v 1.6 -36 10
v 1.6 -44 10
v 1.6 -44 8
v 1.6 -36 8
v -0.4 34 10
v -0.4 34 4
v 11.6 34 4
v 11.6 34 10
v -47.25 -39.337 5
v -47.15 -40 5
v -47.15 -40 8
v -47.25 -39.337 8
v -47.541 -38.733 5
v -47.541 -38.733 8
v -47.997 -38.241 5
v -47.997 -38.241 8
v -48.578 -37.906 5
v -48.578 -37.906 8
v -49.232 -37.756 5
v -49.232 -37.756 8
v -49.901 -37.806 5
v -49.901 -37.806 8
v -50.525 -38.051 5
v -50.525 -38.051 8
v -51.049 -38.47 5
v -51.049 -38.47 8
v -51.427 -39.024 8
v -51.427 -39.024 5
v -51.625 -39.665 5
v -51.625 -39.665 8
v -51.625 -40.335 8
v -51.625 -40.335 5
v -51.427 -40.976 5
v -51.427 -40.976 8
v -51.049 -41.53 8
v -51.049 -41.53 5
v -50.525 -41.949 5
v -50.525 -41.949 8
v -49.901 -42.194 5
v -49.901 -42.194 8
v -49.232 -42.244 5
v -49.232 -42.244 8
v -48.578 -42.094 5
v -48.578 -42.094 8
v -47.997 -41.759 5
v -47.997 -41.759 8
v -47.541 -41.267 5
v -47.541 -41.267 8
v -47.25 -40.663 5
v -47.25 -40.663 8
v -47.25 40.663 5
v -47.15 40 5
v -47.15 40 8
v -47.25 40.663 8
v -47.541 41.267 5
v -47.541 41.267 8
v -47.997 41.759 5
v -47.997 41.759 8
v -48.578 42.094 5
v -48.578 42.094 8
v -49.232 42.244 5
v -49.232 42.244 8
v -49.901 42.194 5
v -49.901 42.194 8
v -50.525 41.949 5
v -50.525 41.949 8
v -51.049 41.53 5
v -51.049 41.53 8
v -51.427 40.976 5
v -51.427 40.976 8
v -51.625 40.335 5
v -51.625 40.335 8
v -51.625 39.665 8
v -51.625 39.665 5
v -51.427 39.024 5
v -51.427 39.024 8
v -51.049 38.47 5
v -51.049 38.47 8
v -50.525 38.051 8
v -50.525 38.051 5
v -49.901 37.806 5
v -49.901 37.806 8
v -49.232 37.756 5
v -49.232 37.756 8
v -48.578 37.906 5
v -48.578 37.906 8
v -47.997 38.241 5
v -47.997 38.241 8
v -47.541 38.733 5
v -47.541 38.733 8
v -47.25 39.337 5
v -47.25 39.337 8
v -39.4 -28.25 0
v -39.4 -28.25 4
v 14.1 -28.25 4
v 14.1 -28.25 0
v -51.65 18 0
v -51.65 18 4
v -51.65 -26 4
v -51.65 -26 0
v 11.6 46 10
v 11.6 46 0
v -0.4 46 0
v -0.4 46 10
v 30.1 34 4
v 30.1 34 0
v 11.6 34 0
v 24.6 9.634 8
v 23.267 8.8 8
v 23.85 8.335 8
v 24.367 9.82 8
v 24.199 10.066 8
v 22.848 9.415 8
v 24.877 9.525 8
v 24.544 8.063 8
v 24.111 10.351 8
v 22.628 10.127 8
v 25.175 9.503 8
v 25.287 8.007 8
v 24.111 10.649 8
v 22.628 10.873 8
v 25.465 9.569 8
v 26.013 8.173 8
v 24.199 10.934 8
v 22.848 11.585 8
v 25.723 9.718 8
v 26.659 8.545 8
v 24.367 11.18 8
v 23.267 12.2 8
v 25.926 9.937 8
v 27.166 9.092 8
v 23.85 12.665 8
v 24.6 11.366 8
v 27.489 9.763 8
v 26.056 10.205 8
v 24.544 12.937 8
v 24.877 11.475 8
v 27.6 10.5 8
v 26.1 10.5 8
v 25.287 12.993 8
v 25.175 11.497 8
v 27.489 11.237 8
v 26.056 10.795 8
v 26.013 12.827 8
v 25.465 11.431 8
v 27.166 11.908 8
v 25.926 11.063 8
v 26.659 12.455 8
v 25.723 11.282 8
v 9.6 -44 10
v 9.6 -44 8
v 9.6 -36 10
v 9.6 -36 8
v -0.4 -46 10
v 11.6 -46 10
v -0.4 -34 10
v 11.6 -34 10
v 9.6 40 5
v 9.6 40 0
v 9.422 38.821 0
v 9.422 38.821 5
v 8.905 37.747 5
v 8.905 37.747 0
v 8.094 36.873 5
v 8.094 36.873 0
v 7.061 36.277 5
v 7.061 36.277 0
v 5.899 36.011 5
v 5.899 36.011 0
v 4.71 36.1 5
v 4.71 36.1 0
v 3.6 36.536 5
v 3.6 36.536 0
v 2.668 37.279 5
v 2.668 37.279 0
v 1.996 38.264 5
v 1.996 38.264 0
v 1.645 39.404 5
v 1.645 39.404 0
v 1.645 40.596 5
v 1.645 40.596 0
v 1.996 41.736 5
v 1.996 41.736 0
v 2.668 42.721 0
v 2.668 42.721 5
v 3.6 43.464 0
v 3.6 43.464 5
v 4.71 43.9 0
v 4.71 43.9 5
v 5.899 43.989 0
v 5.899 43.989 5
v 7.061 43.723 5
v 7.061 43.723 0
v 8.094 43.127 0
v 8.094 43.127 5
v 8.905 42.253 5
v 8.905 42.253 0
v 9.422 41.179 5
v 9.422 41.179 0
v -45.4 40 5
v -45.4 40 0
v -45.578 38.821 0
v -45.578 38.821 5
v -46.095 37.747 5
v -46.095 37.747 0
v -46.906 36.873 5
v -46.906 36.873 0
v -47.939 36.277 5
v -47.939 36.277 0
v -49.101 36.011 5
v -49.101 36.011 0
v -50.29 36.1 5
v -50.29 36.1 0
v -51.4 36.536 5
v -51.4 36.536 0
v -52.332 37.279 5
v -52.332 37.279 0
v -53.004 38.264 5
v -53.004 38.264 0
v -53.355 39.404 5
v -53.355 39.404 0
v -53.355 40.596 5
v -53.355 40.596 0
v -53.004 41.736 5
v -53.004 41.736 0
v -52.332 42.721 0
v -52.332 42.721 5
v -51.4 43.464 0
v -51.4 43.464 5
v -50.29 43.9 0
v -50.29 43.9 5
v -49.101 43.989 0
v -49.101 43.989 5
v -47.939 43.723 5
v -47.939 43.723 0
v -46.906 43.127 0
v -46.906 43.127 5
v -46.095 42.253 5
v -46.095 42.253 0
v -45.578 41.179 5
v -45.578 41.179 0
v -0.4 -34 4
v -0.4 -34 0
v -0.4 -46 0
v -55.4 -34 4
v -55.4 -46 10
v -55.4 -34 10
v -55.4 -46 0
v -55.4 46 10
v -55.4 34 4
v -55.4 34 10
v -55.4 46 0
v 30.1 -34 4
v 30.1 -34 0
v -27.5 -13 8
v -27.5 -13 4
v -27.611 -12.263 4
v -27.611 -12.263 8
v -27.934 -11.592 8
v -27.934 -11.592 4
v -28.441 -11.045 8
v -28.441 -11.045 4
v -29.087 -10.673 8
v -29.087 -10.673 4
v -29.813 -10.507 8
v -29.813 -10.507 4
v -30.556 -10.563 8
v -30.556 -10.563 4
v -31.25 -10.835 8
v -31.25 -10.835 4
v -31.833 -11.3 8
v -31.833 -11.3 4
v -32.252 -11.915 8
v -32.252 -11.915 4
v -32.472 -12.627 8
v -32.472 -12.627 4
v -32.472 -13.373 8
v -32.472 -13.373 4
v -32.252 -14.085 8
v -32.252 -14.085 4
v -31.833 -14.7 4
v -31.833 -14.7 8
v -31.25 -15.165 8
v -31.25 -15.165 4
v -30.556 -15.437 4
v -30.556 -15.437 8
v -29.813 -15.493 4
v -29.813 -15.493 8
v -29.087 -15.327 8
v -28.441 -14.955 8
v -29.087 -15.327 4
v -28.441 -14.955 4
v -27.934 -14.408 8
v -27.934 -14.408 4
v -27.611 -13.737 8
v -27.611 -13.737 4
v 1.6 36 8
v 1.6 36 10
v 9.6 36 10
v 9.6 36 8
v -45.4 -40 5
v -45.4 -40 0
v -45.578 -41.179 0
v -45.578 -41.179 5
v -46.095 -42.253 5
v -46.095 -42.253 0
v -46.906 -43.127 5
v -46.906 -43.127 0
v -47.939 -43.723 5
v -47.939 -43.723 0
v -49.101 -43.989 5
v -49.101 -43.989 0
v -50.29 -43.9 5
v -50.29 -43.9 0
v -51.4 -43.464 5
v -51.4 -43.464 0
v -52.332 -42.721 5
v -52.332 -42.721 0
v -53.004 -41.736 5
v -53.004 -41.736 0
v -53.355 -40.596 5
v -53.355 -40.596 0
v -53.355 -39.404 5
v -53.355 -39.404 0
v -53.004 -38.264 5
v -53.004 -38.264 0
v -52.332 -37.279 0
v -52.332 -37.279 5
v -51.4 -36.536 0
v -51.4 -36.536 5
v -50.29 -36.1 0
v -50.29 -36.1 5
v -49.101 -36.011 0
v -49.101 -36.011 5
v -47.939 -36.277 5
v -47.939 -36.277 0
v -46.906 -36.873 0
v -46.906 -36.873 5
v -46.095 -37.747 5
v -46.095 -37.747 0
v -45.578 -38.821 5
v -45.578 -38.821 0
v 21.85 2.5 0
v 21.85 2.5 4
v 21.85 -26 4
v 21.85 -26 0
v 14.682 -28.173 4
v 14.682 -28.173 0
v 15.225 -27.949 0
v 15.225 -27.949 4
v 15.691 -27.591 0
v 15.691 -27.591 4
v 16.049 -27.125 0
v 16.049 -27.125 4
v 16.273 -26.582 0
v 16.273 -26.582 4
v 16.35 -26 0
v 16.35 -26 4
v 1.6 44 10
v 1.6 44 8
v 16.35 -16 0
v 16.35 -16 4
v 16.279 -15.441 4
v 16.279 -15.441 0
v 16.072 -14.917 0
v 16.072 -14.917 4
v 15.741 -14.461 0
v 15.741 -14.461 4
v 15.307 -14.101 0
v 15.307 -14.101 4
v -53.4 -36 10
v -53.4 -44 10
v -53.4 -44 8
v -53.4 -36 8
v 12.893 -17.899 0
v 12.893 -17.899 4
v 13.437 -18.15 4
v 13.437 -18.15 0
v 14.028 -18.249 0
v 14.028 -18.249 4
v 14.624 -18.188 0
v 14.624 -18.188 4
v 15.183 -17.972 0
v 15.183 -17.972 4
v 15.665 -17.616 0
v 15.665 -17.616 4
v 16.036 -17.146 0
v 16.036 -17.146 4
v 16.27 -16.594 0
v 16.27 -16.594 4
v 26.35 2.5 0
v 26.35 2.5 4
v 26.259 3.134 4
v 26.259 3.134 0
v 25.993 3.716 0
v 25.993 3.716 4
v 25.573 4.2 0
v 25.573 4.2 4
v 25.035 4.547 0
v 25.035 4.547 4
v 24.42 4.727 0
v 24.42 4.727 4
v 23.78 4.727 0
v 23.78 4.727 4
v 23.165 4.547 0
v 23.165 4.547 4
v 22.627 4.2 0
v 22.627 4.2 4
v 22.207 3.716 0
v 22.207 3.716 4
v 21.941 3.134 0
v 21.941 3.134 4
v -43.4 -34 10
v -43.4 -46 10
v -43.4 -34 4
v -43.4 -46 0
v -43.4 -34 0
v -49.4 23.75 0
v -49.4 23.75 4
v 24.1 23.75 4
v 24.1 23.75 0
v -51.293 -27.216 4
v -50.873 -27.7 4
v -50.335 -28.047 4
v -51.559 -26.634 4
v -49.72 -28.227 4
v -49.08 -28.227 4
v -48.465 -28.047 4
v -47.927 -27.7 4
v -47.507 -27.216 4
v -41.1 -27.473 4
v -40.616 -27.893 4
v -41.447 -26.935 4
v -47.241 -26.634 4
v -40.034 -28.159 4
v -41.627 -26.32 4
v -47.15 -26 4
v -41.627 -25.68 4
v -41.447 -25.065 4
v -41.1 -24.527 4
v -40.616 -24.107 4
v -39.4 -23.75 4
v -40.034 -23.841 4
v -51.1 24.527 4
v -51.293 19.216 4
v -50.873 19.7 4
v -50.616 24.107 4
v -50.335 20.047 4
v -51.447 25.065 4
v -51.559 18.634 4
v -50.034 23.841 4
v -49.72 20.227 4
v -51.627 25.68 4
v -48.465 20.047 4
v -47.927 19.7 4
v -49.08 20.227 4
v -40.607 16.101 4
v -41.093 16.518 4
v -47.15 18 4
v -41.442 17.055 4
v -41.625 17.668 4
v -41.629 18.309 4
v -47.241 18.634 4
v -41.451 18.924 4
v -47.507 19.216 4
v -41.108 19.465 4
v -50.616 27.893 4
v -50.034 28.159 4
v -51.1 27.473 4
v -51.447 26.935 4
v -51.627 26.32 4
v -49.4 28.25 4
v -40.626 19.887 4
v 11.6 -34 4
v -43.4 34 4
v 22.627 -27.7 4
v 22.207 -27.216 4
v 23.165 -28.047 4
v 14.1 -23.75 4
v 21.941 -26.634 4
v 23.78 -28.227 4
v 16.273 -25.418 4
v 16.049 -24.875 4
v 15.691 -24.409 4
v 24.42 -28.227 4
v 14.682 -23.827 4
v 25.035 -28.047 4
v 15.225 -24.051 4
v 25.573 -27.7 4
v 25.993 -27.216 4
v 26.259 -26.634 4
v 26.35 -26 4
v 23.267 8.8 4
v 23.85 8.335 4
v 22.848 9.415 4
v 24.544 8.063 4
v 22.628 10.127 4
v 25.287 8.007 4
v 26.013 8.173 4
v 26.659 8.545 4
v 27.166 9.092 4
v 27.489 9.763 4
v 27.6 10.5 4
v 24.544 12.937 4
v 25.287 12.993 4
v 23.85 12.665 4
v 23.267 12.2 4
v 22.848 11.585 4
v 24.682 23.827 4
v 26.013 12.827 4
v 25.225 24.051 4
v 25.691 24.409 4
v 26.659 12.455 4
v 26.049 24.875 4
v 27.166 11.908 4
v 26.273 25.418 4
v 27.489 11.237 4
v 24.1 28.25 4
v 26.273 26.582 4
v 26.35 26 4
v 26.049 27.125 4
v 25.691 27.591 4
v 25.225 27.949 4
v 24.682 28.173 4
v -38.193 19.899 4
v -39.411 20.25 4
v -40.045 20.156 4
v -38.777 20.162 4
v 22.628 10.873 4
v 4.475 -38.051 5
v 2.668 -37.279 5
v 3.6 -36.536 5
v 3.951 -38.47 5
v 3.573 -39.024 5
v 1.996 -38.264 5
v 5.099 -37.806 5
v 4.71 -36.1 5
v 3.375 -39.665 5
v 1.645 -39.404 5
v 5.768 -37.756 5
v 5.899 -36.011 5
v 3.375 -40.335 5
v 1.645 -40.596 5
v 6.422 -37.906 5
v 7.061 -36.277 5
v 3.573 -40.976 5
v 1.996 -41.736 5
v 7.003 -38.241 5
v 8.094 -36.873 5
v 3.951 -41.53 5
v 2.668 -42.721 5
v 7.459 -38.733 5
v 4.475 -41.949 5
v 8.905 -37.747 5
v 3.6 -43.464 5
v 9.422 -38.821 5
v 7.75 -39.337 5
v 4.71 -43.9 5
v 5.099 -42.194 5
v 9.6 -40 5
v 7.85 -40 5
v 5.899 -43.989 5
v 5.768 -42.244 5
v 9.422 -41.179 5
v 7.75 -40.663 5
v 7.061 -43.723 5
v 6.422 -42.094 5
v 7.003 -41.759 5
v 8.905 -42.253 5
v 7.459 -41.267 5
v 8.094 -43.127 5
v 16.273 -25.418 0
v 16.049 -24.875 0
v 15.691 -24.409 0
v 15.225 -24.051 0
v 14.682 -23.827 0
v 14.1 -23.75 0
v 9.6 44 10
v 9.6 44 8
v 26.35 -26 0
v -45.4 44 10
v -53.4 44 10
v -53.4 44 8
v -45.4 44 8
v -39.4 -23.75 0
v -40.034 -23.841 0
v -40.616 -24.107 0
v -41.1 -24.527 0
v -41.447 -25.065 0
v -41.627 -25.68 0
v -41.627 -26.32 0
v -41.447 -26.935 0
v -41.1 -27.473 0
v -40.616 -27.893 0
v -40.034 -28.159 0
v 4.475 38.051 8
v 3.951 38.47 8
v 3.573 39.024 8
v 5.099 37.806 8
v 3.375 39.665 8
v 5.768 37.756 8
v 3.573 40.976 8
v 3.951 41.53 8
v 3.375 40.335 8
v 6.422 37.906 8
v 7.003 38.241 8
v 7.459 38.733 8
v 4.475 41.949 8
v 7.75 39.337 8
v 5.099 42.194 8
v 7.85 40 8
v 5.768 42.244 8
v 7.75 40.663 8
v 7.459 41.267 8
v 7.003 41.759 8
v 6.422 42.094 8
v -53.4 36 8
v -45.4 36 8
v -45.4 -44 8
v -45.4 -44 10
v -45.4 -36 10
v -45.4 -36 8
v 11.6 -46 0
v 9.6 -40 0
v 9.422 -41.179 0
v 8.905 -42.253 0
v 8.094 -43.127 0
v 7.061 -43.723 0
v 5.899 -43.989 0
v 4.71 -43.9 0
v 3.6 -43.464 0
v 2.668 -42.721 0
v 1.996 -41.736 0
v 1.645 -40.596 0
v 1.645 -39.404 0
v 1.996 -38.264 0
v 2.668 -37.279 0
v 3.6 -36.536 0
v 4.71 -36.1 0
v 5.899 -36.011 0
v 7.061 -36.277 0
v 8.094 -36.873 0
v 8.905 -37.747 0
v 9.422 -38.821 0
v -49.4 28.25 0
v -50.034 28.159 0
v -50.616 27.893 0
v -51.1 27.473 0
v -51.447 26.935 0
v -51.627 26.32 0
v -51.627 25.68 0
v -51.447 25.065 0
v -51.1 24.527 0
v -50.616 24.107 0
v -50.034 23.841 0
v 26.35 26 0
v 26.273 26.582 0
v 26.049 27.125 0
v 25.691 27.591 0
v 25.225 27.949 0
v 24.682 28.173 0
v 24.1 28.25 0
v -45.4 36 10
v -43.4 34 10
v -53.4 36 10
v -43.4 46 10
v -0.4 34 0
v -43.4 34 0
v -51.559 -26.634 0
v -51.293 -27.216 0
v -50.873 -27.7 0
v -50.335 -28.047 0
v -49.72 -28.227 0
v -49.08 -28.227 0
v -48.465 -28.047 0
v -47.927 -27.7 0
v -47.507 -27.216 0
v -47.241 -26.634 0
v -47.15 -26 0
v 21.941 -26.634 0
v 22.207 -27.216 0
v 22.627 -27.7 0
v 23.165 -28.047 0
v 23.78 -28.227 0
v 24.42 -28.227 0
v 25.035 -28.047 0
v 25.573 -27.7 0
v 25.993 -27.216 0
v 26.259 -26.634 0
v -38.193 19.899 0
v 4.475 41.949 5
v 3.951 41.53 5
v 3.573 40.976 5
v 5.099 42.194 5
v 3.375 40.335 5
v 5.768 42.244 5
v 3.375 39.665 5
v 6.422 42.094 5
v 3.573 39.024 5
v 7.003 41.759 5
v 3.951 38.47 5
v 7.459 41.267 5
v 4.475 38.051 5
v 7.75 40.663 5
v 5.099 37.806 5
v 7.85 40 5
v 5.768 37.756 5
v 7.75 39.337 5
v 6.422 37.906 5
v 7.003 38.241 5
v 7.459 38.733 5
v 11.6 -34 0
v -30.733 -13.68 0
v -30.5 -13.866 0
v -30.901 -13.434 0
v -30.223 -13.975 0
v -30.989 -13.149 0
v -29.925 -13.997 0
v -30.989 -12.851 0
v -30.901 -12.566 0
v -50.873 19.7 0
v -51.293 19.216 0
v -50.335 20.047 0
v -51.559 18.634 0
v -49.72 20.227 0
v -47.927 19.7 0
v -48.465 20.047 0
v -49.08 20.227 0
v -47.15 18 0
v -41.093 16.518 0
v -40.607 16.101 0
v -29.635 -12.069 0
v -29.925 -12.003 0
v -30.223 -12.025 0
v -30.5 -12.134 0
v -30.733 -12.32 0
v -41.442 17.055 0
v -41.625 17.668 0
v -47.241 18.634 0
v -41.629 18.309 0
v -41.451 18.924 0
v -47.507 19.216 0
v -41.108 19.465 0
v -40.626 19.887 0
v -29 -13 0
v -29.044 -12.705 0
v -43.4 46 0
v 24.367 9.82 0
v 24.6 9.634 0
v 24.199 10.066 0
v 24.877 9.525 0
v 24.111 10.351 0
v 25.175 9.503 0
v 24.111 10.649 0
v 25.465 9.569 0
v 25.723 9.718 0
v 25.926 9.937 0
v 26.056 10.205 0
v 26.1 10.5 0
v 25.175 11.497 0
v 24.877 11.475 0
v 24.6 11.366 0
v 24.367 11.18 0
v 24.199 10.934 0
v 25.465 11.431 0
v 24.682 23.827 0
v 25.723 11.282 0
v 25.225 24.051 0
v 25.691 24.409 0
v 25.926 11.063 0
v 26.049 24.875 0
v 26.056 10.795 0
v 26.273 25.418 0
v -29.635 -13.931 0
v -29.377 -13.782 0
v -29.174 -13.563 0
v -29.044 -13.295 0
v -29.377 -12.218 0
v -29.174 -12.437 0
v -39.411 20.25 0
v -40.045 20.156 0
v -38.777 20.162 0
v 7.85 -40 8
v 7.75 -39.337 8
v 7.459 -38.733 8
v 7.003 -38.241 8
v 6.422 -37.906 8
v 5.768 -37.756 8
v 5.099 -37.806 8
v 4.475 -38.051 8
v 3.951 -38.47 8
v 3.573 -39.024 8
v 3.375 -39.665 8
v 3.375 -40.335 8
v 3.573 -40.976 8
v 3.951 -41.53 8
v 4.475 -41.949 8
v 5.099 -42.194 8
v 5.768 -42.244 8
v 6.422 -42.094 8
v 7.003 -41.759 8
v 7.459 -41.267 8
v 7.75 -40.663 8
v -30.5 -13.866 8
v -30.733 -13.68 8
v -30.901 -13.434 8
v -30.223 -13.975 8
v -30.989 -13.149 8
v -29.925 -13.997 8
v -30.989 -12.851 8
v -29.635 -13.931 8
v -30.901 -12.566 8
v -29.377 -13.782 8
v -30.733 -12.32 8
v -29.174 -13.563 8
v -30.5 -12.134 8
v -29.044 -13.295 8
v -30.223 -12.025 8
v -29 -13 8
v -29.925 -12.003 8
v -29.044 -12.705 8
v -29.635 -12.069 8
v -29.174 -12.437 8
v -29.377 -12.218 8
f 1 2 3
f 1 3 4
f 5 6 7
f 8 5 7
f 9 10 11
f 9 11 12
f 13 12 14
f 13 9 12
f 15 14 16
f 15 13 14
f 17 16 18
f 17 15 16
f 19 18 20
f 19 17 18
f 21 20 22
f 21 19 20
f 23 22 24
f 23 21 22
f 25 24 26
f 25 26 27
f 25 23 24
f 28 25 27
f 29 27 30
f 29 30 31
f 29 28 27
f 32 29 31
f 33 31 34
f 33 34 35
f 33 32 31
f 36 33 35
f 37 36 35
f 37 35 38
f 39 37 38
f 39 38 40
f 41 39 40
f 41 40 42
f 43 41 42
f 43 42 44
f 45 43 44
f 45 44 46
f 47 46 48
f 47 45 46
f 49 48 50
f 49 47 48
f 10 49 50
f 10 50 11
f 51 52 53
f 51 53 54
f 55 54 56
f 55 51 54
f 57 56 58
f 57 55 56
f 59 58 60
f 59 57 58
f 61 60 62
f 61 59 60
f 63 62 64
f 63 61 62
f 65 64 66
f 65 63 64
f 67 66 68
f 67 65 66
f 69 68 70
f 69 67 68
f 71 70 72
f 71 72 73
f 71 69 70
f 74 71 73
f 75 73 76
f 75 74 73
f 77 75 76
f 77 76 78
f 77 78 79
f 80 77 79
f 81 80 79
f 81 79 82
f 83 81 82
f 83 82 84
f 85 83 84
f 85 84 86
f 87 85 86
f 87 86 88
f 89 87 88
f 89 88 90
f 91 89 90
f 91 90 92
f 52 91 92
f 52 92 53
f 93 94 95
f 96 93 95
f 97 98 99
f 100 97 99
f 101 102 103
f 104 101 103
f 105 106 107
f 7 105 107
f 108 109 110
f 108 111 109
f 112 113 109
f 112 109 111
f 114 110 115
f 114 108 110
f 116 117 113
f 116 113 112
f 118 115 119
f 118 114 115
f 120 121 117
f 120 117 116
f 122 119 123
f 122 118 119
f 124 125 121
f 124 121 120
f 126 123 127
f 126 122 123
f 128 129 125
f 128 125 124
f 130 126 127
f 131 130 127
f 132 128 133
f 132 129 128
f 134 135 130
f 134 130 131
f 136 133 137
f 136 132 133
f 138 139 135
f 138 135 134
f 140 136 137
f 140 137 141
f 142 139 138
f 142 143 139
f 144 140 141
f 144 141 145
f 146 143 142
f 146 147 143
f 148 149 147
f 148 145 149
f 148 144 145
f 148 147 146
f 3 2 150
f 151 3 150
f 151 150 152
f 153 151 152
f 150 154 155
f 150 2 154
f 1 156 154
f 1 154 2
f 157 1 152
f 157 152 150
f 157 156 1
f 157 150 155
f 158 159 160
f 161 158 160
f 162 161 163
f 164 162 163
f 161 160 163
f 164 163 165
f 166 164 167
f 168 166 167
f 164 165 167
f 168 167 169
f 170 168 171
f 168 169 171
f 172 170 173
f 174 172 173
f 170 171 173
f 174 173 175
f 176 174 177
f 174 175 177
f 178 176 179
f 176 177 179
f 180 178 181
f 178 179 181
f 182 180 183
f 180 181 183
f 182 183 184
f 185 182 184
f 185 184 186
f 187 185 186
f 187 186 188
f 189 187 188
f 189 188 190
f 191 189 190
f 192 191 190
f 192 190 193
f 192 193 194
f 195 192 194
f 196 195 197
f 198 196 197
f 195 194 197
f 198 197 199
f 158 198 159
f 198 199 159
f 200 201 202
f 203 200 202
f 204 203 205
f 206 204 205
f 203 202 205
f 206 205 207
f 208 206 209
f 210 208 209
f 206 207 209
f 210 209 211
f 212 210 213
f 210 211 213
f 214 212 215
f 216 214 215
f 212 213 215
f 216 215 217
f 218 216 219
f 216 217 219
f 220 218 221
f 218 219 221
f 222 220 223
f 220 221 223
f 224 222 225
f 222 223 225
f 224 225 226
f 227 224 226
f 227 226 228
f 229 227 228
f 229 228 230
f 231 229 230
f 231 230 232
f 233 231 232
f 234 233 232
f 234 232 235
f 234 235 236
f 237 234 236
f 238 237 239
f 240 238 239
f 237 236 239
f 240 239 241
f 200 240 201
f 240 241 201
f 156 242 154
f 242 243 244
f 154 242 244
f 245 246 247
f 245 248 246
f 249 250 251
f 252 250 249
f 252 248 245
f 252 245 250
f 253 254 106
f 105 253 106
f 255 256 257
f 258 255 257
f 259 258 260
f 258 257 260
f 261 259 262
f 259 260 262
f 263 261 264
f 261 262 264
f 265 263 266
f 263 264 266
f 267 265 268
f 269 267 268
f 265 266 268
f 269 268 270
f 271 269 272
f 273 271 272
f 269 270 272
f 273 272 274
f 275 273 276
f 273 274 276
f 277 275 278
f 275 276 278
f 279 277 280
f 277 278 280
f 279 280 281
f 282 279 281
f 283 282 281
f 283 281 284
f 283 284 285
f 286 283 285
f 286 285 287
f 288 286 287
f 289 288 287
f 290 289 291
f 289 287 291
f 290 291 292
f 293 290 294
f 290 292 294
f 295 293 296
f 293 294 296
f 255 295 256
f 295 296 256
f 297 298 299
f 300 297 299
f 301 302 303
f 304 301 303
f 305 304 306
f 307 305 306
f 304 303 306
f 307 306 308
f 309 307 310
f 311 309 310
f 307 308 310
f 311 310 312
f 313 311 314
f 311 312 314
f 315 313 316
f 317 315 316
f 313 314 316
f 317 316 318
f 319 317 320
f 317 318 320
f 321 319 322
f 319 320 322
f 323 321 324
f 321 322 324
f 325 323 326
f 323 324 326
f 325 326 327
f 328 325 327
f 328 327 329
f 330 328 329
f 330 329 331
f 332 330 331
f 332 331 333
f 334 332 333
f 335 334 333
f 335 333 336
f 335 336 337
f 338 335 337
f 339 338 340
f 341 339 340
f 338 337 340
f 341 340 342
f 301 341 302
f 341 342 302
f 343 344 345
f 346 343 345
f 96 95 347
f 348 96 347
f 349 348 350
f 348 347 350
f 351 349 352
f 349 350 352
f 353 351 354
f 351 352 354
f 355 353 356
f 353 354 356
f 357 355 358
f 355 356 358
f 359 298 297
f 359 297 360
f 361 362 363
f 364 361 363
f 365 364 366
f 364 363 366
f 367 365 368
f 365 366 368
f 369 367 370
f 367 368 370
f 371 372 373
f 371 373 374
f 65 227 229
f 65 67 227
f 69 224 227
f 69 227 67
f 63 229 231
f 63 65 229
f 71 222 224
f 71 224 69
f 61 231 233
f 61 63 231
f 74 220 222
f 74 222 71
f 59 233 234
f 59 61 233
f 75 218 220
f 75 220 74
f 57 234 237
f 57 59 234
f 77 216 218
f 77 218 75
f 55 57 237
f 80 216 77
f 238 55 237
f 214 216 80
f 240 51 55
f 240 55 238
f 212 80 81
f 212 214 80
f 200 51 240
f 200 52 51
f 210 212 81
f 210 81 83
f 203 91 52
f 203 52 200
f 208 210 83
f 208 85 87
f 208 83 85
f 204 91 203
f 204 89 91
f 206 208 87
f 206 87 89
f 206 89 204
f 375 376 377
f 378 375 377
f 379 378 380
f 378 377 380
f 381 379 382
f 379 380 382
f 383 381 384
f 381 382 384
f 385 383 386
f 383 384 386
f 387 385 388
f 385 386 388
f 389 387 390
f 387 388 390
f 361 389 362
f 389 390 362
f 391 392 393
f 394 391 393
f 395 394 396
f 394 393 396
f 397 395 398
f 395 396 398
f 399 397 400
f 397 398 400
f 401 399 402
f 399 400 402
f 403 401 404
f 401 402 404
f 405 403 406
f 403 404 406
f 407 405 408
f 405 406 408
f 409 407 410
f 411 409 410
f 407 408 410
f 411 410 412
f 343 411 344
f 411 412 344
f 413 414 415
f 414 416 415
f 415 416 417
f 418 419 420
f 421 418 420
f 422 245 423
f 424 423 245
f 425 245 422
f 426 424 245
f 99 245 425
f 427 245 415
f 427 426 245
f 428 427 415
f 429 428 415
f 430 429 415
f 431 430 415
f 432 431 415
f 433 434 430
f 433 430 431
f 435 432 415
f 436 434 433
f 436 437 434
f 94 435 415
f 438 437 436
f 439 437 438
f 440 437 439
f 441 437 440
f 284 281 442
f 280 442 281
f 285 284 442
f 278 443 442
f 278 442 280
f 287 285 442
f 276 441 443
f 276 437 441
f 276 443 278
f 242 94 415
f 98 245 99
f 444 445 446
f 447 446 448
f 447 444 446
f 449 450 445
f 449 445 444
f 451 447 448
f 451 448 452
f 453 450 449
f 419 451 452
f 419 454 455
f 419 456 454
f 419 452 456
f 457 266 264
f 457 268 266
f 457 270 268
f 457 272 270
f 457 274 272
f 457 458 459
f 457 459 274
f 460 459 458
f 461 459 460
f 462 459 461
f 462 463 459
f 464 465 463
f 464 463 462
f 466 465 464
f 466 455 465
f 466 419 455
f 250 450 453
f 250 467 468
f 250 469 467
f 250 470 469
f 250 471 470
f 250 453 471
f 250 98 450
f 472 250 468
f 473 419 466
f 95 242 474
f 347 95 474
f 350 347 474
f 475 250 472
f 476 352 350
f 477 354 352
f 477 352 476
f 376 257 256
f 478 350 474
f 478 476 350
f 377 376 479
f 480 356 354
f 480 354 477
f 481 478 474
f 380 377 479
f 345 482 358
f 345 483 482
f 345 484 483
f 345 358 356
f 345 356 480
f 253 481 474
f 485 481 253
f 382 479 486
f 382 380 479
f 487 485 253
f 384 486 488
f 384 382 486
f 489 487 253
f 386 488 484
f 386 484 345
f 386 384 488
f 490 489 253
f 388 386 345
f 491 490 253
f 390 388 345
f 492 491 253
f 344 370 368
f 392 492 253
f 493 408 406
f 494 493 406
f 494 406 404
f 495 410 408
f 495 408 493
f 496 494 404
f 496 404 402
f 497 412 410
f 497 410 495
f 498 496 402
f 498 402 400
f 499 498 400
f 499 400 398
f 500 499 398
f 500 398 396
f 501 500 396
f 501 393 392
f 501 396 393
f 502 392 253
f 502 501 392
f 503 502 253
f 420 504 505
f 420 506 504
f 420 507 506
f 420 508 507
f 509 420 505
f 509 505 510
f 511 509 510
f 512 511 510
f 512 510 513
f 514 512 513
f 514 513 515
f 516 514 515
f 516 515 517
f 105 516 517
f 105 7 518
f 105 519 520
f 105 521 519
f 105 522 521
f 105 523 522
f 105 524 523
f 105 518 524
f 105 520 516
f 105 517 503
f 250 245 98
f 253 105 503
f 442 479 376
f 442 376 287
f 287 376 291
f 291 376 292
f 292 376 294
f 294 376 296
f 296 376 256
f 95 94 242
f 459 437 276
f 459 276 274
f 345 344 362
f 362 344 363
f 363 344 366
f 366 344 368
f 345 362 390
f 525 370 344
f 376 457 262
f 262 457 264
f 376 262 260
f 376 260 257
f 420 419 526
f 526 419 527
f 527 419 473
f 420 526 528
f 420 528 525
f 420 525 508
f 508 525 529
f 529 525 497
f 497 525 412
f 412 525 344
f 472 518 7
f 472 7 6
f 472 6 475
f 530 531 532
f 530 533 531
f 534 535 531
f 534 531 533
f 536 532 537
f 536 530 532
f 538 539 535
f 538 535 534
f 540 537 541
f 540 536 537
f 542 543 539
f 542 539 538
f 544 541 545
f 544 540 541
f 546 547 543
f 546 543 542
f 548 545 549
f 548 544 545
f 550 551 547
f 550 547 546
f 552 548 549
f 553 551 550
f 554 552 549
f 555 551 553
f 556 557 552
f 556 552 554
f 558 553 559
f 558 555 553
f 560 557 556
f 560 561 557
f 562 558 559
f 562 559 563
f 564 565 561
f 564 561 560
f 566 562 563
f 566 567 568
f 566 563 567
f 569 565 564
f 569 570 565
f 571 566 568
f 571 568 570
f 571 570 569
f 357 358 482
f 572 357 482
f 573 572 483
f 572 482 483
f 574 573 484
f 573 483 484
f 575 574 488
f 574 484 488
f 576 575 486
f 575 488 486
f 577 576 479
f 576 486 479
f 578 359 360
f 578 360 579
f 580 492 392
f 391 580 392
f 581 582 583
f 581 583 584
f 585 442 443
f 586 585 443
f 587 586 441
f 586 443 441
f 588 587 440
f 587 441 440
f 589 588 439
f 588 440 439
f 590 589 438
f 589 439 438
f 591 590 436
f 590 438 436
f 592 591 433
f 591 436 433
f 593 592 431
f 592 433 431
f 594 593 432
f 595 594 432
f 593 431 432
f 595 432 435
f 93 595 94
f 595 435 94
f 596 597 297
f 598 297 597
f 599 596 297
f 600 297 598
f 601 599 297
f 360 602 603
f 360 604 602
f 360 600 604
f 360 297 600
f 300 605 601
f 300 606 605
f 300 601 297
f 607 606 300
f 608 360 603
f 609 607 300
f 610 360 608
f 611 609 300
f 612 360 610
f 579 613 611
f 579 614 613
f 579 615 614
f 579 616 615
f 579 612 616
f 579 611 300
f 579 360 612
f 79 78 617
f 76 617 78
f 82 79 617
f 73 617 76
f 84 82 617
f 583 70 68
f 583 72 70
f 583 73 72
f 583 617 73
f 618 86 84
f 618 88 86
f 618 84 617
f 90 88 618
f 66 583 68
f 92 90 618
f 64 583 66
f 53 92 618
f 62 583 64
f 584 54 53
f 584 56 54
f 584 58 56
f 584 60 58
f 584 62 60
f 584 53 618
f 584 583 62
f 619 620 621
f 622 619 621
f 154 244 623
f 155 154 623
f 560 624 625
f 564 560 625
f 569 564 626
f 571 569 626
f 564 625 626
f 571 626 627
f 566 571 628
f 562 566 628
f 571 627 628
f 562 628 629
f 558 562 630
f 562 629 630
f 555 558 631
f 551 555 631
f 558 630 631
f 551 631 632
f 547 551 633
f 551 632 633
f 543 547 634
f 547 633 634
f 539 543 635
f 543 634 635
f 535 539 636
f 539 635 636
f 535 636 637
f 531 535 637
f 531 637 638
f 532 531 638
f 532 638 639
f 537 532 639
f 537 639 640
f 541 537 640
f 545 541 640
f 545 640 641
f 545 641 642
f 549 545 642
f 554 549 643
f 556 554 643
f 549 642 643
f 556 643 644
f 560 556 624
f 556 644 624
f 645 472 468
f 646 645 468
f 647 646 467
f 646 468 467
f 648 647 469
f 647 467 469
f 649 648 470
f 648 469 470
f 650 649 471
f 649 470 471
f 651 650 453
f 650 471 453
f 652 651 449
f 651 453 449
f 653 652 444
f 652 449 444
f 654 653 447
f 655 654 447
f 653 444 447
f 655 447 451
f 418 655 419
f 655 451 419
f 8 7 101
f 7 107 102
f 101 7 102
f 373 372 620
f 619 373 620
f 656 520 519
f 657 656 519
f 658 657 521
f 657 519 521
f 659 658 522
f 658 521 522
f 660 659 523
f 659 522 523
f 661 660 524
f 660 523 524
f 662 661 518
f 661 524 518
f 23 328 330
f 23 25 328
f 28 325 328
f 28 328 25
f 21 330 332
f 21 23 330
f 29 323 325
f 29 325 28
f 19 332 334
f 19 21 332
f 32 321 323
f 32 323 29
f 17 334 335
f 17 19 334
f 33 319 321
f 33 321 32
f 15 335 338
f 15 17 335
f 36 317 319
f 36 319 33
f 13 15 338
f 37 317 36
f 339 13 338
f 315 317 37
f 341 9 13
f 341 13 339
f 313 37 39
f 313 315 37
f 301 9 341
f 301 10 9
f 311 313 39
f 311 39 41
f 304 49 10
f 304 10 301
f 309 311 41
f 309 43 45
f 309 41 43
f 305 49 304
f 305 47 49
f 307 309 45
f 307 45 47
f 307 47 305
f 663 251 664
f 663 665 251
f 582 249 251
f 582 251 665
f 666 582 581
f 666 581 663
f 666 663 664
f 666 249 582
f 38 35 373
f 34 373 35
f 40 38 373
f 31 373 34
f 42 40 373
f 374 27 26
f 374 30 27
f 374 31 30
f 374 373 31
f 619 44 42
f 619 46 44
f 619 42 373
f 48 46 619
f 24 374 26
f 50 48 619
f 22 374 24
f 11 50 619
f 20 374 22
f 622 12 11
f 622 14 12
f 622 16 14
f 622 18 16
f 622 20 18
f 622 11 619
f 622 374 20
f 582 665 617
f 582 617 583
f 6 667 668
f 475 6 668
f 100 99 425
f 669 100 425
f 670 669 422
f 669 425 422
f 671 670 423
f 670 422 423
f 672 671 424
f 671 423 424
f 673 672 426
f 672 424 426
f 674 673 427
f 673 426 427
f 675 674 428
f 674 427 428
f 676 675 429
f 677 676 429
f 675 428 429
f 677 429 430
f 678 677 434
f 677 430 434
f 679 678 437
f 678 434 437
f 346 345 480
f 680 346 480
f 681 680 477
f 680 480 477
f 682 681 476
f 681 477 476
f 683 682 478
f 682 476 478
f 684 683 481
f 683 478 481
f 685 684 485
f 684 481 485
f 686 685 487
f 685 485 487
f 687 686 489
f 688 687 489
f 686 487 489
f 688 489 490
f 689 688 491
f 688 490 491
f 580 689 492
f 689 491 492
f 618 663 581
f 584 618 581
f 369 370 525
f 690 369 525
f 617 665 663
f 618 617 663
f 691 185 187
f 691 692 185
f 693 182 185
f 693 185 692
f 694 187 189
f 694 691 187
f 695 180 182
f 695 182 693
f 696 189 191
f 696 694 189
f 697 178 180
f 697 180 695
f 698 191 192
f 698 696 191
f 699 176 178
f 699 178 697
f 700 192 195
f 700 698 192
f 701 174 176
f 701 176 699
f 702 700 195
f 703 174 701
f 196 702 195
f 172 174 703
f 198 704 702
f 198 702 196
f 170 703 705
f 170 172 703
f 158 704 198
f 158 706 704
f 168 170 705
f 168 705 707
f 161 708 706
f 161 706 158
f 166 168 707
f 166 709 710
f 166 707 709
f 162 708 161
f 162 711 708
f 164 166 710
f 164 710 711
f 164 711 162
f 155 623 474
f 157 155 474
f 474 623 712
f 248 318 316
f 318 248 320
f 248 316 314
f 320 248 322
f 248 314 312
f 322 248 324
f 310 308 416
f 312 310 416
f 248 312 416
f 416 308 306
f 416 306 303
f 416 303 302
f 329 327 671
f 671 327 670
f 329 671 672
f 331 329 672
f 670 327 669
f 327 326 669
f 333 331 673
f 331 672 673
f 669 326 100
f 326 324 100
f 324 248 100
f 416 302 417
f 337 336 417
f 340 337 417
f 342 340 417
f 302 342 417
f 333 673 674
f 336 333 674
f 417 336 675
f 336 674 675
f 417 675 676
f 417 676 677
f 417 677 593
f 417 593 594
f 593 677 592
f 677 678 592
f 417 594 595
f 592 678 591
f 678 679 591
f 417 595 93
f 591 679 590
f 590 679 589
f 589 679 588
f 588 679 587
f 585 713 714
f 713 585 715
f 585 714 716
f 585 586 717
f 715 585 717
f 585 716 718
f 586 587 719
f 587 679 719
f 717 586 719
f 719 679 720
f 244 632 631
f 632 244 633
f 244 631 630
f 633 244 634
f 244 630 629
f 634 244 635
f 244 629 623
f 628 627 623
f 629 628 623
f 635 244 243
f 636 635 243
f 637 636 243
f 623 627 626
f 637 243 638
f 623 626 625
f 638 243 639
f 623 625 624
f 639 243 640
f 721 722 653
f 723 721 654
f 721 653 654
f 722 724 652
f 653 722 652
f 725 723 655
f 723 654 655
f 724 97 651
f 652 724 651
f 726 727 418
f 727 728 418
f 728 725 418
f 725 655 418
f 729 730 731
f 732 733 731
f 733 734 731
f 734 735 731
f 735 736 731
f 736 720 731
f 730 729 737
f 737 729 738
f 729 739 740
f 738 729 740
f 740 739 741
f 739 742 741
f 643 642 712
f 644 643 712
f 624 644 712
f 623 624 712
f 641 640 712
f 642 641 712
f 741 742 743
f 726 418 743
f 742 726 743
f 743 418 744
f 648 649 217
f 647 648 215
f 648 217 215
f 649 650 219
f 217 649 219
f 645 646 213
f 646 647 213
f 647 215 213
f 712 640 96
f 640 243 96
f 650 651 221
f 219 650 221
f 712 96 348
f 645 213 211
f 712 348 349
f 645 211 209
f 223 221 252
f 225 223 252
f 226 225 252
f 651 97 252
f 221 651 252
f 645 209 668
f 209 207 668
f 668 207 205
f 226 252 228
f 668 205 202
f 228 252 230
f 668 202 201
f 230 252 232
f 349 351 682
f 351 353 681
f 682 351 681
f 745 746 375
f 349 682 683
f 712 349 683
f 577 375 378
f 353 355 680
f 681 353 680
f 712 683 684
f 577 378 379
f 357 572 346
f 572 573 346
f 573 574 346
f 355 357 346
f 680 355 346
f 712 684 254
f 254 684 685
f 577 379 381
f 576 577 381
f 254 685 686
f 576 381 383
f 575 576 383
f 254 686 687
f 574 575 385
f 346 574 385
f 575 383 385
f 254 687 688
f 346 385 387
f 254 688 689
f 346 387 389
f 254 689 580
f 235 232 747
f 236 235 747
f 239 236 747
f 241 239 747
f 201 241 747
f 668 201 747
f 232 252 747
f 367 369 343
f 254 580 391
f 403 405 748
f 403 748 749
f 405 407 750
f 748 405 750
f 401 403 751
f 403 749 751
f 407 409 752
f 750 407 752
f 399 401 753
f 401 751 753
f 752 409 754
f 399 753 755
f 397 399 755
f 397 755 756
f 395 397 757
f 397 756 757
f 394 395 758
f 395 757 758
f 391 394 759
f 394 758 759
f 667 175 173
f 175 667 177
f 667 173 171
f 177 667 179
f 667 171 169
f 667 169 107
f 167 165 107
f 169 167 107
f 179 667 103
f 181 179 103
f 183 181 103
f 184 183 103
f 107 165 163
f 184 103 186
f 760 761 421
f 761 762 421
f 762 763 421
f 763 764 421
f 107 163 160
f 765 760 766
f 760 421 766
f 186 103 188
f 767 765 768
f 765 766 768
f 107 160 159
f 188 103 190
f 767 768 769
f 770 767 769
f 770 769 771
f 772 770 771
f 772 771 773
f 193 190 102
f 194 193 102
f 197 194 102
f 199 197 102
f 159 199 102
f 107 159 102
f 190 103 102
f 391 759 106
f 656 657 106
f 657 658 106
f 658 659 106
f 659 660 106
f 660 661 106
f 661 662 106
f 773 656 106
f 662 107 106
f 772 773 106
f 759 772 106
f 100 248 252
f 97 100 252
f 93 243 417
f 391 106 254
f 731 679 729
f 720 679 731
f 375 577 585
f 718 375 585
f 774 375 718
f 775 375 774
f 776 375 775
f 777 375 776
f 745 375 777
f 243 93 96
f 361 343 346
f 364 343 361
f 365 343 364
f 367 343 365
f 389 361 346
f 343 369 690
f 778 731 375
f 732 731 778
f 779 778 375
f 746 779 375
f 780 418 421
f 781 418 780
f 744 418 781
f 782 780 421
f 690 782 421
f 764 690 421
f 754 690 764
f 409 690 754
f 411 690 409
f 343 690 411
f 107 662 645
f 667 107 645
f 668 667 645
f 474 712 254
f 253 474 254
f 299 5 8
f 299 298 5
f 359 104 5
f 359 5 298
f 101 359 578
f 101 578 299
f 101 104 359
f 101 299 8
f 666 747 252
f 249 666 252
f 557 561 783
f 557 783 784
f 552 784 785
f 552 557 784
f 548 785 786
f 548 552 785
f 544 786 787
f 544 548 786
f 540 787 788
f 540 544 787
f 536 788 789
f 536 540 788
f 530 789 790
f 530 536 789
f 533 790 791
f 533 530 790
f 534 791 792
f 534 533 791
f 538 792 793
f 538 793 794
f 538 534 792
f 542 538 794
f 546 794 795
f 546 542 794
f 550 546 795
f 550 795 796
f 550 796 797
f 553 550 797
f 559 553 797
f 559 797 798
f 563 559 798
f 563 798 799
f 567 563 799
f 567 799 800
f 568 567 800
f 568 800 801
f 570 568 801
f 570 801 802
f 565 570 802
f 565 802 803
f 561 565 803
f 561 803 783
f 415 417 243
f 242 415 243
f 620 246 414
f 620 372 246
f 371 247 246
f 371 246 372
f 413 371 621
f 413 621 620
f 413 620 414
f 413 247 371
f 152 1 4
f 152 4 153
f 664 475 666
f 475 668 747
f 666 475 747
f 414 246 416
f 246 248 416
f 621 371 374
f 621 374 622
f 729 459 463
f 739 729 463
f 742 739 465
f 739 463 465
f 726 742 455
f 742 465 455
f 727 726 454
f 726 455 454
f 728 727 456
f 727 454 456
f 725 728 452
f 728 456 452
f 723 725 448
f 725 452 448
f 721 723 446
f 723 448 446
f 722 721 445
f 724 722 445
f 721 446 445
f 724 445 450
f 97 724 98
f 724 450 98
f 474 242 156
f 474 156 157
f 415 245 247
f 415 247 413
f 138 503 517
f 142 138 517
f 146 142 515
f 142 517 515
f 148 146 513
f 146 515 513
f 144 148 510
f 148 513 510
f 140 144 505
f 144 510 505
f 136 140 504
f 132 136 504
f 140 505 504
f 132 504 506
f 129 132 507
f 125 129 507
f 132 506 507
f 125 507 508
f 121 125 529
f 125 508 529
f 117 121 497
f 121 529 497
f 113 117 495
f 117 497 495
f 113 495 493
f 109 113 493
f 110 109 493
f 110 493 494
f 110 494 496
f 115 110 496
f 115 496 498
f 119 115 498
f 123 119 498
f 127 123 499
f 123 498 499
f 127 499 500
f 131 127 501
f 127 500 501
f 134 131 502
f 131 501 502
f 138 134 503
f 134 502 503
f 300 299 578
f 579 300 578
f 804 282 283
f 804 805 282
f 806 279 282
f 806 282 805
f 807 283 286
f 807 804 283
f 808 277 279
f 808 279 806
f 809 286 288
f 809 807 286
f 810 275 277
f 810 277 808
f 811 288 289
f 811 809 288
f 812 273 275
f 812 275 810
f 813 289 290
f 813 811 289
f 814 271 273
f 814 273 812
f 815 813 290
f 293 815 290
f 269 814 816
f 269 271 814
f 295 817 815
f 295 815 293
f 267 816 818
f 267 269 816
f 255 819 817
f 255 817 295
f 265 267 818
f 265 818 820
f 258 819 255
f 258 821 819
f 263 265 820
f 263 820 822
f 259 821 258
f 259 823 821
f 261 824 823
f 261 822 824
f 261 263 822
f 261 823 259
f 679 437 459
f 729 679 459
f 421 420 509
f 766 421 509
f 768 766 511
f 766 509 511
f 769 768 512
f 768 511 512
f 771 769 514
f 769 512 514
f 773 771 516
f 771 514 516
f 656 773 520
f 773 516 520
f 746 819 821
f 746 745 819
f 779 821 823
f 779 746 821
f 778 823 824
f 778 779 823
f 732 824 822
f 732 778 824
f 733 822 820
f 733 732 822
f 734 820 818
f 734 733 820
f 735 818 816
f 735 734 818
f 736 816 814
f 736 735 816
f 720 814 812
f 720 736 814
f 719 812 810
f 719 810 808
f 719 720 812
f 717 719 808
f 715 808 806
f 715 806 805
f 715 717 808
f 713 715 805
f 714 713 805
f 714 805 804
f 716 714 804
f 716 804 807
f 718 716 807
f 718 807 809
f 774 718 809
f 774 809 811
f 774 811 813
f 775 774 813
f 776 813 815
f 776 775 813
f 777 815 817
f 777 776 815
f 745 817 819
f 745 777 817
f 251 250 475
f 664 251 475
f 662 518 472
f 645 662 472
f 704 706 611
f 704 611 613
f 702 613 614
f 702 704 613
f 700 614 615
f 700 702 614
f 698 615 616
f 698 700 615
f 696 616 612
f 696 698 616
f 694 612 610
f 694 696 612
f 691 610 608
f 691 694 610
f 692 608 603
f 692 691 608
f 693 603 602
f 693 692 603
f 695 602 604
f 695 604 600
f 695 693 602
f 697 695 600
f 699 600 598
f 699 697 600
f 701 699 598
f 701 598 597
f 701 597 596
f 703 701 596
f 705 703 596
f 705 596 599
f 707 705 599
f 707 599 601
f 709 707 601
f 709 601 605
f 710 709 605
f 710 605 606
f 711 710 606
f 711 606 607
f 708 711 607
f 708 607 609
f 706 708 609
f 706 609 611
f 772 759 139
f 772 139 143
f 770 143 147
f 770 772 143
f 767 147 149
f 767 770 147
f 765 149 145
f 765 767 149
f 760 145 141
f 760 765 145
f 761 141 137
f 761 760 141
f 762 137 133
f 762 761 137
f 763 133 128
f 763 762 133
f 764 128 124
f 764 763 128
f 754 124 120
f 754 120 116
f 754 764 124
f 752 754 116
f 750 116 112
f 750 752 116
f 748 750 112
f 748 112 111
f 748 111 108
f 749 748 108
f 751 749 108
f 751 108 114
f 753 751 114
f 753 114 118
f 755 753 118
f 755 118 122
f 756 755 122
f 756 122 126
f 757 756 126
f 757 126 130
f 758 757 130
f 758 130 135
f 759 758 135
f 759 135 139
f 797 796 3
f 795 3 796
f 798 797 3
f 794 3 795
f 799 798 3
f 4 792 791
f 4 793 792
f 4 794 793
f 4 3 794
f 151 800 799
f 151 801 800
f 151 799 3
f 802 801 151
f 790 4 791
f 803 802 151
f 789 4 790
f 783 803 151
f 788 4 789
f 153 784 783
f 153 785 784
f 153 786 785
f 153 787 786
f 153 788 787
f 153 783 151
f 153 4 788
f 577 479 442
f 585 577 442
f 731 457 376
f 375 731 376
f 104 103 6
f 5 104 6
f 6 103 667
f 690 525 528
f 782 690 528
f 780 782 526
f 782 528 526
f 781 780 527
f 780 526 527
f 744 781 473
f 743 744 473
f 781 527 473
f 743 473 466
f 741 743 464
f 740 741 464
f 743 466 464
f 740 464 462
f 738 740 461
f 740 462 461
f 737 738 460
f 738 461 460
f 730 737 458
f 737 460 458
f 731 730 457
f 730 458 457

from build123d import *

# Parameters (mm, degrees)
F0_R      = 2.25
F0_R_2    = 1
F1_DEPTH  = 4
F2_W      = 12
F2_H      = 12
F2_R      = 2.25
F3_DEPTH  = 6
F4_W      = 8
F4_H      = 8
F4_R      = 2.25
F5_DEPTH  = 2
F6_R      = 4
F6_R_2    = 2.25
F7_DEPTH  = 5
F8_R      = 2.5
F8_R_2    = 1
F9_DEPTH  = 4
F11_DEPTH = 4.001


# Not quite as in the source:
# - a feature names something its author has since deleted; it is built from what else it names


with BuildPart() as f1:
    # F0 (on Top) → F1 (new body)
    with BuildSketch(Plane.XY):
        Polygon((-43.4, 46), (-55.4, 46), (-55.4, -46), (-43.4, -46), (-43.4, -34), (-0.4, -34), (-0.4, -46), (11.6, -46), (11.6, -34), (30.1, -34), (30.1, 34), (11.6, 34), (11.6, 46), (-0.4, 46), (-0.4, 34), (-43.4, 34), align=None)
        with Locations((-49.4, -40)):
            Circle(F0_R, mode=Mode.SUBTRACT)
        with Locations((-30, -13)):
            Circle(F0_R_2, mode=Mode.SUBTRACT)
        with Locations((5.6, -40)):
            Circle(F0_R, mode=Mode.SUBTRACT)
        with Locations((-49.4, 40)):
            Circle(F0_R, mode=Mode.SUBTRACT)
        with Locations((25.1, 10.5)):
            Circle(F0_R_2, mode=Mode.SUBTRACT)
        with Locations((5.6, 40)):
            Circle(F0_R, mode=Mode.SUBTRACT)
    extrude(amount=F1_DEPTH)

    # F2 (on face) → F3 (join)
    with BuildSketch(Plane.XY.offset(4)):
        with Locations((-49.4, -40)):
            Rectangle(F2_W, F2_H)
        with Locations((-49.4, -40)):
            Circle(F2_R, mode=Mode.SUBTRACT)
        with Locations((-49.4, 40)):
            Rectangle(F2_W, F2_H)
        with Locations((-49.4, 40)):
            Circle(F2_R, mode=Mode.SUBTRACT)
        with Locations((5.6, 40)):
            Rectangle(F2_W, F2_H)
        with Locations((5.6, 40)):
            Circle(F2_R, mode=Mode.SUBTRACT)
        with Locations((5.6, -40)):
            Rectangle(F2_W, F2_H)
        with Locations((5.6, -40)):
            Circle(F2_R, mode=Mode.SUBTRACT)
    extrude(amount=F3_DEPTH)

    # F4 (on face) → F5 (cut)
    with BuildSketch(Plane.XY.offset(10)):
        with Locations((-49.4, 40)):
            Rectangle(F4_W, F4_H)
        with Locations((-49.4, 40)):
            Circle(F4_R, mode=Mode.SUBTRACT)
        with Locations((5.6, 40)):
            Rectangle(F4_W, F4_H)
        with Locations((5.6, 40)):
            Circle(F4_R, mode=Mode.SUBTRACT)
        with Locations((5.6, -40)):
            Rectangle(F4_W, F4_H)
        with Locations((5.6, -40)):
            Circle(F4_R, mode=Mode.SUBTRACT)
        with Locations((-49.4, -40)):
            Rectangle(F4_W, F4_H)
        with Locations((-49.4, -40)):
            Circle(F4_R, mode=Mode.SUBTRACT)
    extrude(amount=-F5_DEPTH, mode=Mode.SUBTRACT)

    # F6 (on face) → F7 (cut)
    with BuildSketch(Plane(origin=(0, 0, 0), x_dir=(1, 0, 0), z_dir=(0, 0, -1))):
        with Locations((-49.4, 40)):
            Circle(F6_R)
        with Locations((-49.4, 40)):
            Circle(F6_R_2, mode=Mode.SUBTRACT)
        with Locations((5.6, 40)):
            Circle(F6_R)
        with Locations((5.6, 40)):
            Circle(F6_R_2, mode=Mode.SUBTRACT)
        with Locations((5.6, -40)):
            Circle(F6_R)
        with Locations((5.6, -40)):
            Circle(F6_R_2, mode=Mode.SUBTRACT)
        with Locations((-49.4, -40)):
            Circle(F6_R)
        with Locations((-49.4, -40)):
            Circle(F6_R_2, mode=Mode.SUBTRACT)
    extrude(amount=-F7_DEPTH, mode=Mode.SUBTRACT)

    # F8 (on face) → F9 (join)
    with BuildSketch(Plane.XY.offset(4)):
        with Locations((-30, -13)):
            Circle(F8_R)
        with Locations((-30, -13)):
            Circle(F8_R_2, mode=Mode.SUBTRACT)
        with Locations((25.1, 10.5)):
            Circle(F8_R)
        with Locations((25.1, 10.5)):
            Circle(F8_R_2, mode=Mode.SUBTRACT)
    extrude(amount=F9_DEPTH)

    # F10 (on face) → F11 (cut, through all)
    with BuildSketch(Plane.XY.offset(4)):
        with BuildLine():
            ThreePointArc((-49.4, 28.25), (-47.8090097423, 27.5909902577), (-47.15, 26))
            ThreePointArc((-47.15, 26), (-47.8090097423, 24.4090097423), (-49.4, 23.75))
            Line((-49.4, 23.75), (24.1, 23.75))
            ThreePointArc((24.1, 23.75), (21.85, 26), (24.1, 28.25))
            Line((24.1, 28.25), (-49.4, 28.25))
        make_face()
        with BuildLine():
            ThreePointArc((-49.4, 23.75), (-47.8090097423, 24.4090097423), (-47.15, 26))
            ThreePointArc((-47.15, 26), (-47.8090097423, 27.5909902577), (-49.4, 28.25))
            ThreePointArc((-49.4, 28.25), (-51.65, 26), (-49.4, 23.75))
        make_face()
        with BuildLine():
            Line((-47.15, -26), (-47.15, 18))
            ThreePointArc((-47.15, 18), (-49.4, 15.75), (-51.65, 18))
            Line((-51.65, 18), (-51.65, -26))
            ThreePointArc((-51.65, -26), (-49.4, -23.75), (-47.15, -26))
        make_face()
        with BuildLine():
            ThreePointArc((-51.65, 18), (-49.4, 15.75), (-47.15, 18))
            ThreePointArc((-47.15, 18), (-49.4, 20.25), (-51.65, 18))
        make_face()
        with BuildLine():
            ThreePointArc((-40.606821277, 16.1010312258), (-38.3166828427, 16.0279645194), (-37.15, 18))
            ThreePointArc((-37.15, 18), (-37.4279645194, 19.0833171573), (-38.193178723, 19.8989687742))
            ThreePointArc((-38.193178723, 19.8989687742), (-41.2989687742, 19.206821277), (-40.606821277, 16.1010312258))
        make_face()
        with BuildLine():
            ThreePointArc((-51.65, -26), (-49.4, -28.25), (-47.15, -26))
            ThreePointArc((-47.15, -26), (-49.4, -23.75), (-51.65, -26))
        make_face()
        with BuildLine():
            ThreePointArc((-39.4, -28.25), (-37.8090097423, -27.5909902577), (-37.15, -26))
            ThreePointArc((-37.15, -26), (-37.8090097423, -24.4090097423), (-39.4, -23.75))
            ThreePointArc((-39.4, -23.75), (-41.65, -26), (-39.4, -28.25))
        make_face()
        with BuildLine():
            ThreePointArc((-39.4, -23.75), (-37.8090097423, -24.4090097423), (-37.15, -26))
            ThreePointArc((-37.15, -26), (-37.8090097423, -27.5909902577), (-39.4, -28.25))
            Line((-39.4, -28.25), (14.1, -28.25))
            ThreePointArc((14.1, -28.25), (11.85, -26), (14.1, -23.75))
            Line((14.1, -23.75), (-39.4, -23.75))
        make_face()
        with BuildLine():
            ThreePointArc((16.35, -26), (15.6909902577, -24.4090097423), (14.1, -23.75))
            ThreePointArc((14.1, -23.75), (11.85, -26), (14.1, -28.25))
            ThreePointArc((14.1, -28.25), (15.6909902577, -27.5909902577), (16.35, -26))
        make_face()
        with BuildLine():
            ThreePointArc((21.85, -26), (24.1, -28.25), (26.35, -26))
            ThreePointArc((26.35, -26), (24.1, -23.75), (21.85, -26))
        make_face()
        with BuildLine():
            ThreePointArc((16.35, -16), (16.0720354806, -14.9166828427), (15.306821277, -14.1010312258))
            ThreePointArc((15.306821277, -14.1010312258), (12.2010312258, -14.793178723), (12.893178723, -17.8989687742))
            ThreePointArc((12.893178723, -17.8989687742), (15.1833171573, -17.9720354806), (16.35, -16))
        make_face()
        with BuildLine():
            ThreePointArc((-38.193178723, 19.8989687742), (-37.4279645194, 19.0833171573), (-37.15, 18))
            ThreePointArc((-37.15, 18), (-38.3166828427, 16.0279645194), (-40.606821277, 16.1010312258))
            Line((-40.606821277, 16.1010312258), (12.893178723, -17.8989687742))
            ThreePointArc((12.893178723, -17.8989687742), (12.2010312258, -14.793178723), (15.306821277, -14.1010312258))
            Line((15.306821277, -14.1010312258), (-38.193178723, 19.8989687742))
        make_face()
        with BuildLine():
            ThreePointArc((21.85, -26), (24.1, -23.75), (26.35, -26))
            Line((26.35, -26), (26.35, 2.5))
            ThreePointArc((26.35, 2.5), (24.1, 0.25), (21.85, 2.5))
            Line((21.85, 2.5), (21.85, -26))
        make_face()
        with BuildLine():
            ThreePointArc((21.85, 2.5), (24.1, 0.25), (26.35, 2.5))
            ThreePointArc((26.35, 2.5), (24.1, 4.75), (21.85, 2.5))
        make_face()
        with BuildLine():
            ThreePointArc((26.35, 26), (25.6909902577, 27.5909902577), (24.1, 28.25))
            ThreePointArc((24.1, 28.25), (21.85, 26), (24.1, 23.75))
            ThreePointArc((24.1, 23.75), (25.6909902577, 24.4090097423), (26.35, 26))
        make_face()
    extrude(amount=-F11_DEPTH, mode=Mode.SUBTRACT)


solid = f1.part
